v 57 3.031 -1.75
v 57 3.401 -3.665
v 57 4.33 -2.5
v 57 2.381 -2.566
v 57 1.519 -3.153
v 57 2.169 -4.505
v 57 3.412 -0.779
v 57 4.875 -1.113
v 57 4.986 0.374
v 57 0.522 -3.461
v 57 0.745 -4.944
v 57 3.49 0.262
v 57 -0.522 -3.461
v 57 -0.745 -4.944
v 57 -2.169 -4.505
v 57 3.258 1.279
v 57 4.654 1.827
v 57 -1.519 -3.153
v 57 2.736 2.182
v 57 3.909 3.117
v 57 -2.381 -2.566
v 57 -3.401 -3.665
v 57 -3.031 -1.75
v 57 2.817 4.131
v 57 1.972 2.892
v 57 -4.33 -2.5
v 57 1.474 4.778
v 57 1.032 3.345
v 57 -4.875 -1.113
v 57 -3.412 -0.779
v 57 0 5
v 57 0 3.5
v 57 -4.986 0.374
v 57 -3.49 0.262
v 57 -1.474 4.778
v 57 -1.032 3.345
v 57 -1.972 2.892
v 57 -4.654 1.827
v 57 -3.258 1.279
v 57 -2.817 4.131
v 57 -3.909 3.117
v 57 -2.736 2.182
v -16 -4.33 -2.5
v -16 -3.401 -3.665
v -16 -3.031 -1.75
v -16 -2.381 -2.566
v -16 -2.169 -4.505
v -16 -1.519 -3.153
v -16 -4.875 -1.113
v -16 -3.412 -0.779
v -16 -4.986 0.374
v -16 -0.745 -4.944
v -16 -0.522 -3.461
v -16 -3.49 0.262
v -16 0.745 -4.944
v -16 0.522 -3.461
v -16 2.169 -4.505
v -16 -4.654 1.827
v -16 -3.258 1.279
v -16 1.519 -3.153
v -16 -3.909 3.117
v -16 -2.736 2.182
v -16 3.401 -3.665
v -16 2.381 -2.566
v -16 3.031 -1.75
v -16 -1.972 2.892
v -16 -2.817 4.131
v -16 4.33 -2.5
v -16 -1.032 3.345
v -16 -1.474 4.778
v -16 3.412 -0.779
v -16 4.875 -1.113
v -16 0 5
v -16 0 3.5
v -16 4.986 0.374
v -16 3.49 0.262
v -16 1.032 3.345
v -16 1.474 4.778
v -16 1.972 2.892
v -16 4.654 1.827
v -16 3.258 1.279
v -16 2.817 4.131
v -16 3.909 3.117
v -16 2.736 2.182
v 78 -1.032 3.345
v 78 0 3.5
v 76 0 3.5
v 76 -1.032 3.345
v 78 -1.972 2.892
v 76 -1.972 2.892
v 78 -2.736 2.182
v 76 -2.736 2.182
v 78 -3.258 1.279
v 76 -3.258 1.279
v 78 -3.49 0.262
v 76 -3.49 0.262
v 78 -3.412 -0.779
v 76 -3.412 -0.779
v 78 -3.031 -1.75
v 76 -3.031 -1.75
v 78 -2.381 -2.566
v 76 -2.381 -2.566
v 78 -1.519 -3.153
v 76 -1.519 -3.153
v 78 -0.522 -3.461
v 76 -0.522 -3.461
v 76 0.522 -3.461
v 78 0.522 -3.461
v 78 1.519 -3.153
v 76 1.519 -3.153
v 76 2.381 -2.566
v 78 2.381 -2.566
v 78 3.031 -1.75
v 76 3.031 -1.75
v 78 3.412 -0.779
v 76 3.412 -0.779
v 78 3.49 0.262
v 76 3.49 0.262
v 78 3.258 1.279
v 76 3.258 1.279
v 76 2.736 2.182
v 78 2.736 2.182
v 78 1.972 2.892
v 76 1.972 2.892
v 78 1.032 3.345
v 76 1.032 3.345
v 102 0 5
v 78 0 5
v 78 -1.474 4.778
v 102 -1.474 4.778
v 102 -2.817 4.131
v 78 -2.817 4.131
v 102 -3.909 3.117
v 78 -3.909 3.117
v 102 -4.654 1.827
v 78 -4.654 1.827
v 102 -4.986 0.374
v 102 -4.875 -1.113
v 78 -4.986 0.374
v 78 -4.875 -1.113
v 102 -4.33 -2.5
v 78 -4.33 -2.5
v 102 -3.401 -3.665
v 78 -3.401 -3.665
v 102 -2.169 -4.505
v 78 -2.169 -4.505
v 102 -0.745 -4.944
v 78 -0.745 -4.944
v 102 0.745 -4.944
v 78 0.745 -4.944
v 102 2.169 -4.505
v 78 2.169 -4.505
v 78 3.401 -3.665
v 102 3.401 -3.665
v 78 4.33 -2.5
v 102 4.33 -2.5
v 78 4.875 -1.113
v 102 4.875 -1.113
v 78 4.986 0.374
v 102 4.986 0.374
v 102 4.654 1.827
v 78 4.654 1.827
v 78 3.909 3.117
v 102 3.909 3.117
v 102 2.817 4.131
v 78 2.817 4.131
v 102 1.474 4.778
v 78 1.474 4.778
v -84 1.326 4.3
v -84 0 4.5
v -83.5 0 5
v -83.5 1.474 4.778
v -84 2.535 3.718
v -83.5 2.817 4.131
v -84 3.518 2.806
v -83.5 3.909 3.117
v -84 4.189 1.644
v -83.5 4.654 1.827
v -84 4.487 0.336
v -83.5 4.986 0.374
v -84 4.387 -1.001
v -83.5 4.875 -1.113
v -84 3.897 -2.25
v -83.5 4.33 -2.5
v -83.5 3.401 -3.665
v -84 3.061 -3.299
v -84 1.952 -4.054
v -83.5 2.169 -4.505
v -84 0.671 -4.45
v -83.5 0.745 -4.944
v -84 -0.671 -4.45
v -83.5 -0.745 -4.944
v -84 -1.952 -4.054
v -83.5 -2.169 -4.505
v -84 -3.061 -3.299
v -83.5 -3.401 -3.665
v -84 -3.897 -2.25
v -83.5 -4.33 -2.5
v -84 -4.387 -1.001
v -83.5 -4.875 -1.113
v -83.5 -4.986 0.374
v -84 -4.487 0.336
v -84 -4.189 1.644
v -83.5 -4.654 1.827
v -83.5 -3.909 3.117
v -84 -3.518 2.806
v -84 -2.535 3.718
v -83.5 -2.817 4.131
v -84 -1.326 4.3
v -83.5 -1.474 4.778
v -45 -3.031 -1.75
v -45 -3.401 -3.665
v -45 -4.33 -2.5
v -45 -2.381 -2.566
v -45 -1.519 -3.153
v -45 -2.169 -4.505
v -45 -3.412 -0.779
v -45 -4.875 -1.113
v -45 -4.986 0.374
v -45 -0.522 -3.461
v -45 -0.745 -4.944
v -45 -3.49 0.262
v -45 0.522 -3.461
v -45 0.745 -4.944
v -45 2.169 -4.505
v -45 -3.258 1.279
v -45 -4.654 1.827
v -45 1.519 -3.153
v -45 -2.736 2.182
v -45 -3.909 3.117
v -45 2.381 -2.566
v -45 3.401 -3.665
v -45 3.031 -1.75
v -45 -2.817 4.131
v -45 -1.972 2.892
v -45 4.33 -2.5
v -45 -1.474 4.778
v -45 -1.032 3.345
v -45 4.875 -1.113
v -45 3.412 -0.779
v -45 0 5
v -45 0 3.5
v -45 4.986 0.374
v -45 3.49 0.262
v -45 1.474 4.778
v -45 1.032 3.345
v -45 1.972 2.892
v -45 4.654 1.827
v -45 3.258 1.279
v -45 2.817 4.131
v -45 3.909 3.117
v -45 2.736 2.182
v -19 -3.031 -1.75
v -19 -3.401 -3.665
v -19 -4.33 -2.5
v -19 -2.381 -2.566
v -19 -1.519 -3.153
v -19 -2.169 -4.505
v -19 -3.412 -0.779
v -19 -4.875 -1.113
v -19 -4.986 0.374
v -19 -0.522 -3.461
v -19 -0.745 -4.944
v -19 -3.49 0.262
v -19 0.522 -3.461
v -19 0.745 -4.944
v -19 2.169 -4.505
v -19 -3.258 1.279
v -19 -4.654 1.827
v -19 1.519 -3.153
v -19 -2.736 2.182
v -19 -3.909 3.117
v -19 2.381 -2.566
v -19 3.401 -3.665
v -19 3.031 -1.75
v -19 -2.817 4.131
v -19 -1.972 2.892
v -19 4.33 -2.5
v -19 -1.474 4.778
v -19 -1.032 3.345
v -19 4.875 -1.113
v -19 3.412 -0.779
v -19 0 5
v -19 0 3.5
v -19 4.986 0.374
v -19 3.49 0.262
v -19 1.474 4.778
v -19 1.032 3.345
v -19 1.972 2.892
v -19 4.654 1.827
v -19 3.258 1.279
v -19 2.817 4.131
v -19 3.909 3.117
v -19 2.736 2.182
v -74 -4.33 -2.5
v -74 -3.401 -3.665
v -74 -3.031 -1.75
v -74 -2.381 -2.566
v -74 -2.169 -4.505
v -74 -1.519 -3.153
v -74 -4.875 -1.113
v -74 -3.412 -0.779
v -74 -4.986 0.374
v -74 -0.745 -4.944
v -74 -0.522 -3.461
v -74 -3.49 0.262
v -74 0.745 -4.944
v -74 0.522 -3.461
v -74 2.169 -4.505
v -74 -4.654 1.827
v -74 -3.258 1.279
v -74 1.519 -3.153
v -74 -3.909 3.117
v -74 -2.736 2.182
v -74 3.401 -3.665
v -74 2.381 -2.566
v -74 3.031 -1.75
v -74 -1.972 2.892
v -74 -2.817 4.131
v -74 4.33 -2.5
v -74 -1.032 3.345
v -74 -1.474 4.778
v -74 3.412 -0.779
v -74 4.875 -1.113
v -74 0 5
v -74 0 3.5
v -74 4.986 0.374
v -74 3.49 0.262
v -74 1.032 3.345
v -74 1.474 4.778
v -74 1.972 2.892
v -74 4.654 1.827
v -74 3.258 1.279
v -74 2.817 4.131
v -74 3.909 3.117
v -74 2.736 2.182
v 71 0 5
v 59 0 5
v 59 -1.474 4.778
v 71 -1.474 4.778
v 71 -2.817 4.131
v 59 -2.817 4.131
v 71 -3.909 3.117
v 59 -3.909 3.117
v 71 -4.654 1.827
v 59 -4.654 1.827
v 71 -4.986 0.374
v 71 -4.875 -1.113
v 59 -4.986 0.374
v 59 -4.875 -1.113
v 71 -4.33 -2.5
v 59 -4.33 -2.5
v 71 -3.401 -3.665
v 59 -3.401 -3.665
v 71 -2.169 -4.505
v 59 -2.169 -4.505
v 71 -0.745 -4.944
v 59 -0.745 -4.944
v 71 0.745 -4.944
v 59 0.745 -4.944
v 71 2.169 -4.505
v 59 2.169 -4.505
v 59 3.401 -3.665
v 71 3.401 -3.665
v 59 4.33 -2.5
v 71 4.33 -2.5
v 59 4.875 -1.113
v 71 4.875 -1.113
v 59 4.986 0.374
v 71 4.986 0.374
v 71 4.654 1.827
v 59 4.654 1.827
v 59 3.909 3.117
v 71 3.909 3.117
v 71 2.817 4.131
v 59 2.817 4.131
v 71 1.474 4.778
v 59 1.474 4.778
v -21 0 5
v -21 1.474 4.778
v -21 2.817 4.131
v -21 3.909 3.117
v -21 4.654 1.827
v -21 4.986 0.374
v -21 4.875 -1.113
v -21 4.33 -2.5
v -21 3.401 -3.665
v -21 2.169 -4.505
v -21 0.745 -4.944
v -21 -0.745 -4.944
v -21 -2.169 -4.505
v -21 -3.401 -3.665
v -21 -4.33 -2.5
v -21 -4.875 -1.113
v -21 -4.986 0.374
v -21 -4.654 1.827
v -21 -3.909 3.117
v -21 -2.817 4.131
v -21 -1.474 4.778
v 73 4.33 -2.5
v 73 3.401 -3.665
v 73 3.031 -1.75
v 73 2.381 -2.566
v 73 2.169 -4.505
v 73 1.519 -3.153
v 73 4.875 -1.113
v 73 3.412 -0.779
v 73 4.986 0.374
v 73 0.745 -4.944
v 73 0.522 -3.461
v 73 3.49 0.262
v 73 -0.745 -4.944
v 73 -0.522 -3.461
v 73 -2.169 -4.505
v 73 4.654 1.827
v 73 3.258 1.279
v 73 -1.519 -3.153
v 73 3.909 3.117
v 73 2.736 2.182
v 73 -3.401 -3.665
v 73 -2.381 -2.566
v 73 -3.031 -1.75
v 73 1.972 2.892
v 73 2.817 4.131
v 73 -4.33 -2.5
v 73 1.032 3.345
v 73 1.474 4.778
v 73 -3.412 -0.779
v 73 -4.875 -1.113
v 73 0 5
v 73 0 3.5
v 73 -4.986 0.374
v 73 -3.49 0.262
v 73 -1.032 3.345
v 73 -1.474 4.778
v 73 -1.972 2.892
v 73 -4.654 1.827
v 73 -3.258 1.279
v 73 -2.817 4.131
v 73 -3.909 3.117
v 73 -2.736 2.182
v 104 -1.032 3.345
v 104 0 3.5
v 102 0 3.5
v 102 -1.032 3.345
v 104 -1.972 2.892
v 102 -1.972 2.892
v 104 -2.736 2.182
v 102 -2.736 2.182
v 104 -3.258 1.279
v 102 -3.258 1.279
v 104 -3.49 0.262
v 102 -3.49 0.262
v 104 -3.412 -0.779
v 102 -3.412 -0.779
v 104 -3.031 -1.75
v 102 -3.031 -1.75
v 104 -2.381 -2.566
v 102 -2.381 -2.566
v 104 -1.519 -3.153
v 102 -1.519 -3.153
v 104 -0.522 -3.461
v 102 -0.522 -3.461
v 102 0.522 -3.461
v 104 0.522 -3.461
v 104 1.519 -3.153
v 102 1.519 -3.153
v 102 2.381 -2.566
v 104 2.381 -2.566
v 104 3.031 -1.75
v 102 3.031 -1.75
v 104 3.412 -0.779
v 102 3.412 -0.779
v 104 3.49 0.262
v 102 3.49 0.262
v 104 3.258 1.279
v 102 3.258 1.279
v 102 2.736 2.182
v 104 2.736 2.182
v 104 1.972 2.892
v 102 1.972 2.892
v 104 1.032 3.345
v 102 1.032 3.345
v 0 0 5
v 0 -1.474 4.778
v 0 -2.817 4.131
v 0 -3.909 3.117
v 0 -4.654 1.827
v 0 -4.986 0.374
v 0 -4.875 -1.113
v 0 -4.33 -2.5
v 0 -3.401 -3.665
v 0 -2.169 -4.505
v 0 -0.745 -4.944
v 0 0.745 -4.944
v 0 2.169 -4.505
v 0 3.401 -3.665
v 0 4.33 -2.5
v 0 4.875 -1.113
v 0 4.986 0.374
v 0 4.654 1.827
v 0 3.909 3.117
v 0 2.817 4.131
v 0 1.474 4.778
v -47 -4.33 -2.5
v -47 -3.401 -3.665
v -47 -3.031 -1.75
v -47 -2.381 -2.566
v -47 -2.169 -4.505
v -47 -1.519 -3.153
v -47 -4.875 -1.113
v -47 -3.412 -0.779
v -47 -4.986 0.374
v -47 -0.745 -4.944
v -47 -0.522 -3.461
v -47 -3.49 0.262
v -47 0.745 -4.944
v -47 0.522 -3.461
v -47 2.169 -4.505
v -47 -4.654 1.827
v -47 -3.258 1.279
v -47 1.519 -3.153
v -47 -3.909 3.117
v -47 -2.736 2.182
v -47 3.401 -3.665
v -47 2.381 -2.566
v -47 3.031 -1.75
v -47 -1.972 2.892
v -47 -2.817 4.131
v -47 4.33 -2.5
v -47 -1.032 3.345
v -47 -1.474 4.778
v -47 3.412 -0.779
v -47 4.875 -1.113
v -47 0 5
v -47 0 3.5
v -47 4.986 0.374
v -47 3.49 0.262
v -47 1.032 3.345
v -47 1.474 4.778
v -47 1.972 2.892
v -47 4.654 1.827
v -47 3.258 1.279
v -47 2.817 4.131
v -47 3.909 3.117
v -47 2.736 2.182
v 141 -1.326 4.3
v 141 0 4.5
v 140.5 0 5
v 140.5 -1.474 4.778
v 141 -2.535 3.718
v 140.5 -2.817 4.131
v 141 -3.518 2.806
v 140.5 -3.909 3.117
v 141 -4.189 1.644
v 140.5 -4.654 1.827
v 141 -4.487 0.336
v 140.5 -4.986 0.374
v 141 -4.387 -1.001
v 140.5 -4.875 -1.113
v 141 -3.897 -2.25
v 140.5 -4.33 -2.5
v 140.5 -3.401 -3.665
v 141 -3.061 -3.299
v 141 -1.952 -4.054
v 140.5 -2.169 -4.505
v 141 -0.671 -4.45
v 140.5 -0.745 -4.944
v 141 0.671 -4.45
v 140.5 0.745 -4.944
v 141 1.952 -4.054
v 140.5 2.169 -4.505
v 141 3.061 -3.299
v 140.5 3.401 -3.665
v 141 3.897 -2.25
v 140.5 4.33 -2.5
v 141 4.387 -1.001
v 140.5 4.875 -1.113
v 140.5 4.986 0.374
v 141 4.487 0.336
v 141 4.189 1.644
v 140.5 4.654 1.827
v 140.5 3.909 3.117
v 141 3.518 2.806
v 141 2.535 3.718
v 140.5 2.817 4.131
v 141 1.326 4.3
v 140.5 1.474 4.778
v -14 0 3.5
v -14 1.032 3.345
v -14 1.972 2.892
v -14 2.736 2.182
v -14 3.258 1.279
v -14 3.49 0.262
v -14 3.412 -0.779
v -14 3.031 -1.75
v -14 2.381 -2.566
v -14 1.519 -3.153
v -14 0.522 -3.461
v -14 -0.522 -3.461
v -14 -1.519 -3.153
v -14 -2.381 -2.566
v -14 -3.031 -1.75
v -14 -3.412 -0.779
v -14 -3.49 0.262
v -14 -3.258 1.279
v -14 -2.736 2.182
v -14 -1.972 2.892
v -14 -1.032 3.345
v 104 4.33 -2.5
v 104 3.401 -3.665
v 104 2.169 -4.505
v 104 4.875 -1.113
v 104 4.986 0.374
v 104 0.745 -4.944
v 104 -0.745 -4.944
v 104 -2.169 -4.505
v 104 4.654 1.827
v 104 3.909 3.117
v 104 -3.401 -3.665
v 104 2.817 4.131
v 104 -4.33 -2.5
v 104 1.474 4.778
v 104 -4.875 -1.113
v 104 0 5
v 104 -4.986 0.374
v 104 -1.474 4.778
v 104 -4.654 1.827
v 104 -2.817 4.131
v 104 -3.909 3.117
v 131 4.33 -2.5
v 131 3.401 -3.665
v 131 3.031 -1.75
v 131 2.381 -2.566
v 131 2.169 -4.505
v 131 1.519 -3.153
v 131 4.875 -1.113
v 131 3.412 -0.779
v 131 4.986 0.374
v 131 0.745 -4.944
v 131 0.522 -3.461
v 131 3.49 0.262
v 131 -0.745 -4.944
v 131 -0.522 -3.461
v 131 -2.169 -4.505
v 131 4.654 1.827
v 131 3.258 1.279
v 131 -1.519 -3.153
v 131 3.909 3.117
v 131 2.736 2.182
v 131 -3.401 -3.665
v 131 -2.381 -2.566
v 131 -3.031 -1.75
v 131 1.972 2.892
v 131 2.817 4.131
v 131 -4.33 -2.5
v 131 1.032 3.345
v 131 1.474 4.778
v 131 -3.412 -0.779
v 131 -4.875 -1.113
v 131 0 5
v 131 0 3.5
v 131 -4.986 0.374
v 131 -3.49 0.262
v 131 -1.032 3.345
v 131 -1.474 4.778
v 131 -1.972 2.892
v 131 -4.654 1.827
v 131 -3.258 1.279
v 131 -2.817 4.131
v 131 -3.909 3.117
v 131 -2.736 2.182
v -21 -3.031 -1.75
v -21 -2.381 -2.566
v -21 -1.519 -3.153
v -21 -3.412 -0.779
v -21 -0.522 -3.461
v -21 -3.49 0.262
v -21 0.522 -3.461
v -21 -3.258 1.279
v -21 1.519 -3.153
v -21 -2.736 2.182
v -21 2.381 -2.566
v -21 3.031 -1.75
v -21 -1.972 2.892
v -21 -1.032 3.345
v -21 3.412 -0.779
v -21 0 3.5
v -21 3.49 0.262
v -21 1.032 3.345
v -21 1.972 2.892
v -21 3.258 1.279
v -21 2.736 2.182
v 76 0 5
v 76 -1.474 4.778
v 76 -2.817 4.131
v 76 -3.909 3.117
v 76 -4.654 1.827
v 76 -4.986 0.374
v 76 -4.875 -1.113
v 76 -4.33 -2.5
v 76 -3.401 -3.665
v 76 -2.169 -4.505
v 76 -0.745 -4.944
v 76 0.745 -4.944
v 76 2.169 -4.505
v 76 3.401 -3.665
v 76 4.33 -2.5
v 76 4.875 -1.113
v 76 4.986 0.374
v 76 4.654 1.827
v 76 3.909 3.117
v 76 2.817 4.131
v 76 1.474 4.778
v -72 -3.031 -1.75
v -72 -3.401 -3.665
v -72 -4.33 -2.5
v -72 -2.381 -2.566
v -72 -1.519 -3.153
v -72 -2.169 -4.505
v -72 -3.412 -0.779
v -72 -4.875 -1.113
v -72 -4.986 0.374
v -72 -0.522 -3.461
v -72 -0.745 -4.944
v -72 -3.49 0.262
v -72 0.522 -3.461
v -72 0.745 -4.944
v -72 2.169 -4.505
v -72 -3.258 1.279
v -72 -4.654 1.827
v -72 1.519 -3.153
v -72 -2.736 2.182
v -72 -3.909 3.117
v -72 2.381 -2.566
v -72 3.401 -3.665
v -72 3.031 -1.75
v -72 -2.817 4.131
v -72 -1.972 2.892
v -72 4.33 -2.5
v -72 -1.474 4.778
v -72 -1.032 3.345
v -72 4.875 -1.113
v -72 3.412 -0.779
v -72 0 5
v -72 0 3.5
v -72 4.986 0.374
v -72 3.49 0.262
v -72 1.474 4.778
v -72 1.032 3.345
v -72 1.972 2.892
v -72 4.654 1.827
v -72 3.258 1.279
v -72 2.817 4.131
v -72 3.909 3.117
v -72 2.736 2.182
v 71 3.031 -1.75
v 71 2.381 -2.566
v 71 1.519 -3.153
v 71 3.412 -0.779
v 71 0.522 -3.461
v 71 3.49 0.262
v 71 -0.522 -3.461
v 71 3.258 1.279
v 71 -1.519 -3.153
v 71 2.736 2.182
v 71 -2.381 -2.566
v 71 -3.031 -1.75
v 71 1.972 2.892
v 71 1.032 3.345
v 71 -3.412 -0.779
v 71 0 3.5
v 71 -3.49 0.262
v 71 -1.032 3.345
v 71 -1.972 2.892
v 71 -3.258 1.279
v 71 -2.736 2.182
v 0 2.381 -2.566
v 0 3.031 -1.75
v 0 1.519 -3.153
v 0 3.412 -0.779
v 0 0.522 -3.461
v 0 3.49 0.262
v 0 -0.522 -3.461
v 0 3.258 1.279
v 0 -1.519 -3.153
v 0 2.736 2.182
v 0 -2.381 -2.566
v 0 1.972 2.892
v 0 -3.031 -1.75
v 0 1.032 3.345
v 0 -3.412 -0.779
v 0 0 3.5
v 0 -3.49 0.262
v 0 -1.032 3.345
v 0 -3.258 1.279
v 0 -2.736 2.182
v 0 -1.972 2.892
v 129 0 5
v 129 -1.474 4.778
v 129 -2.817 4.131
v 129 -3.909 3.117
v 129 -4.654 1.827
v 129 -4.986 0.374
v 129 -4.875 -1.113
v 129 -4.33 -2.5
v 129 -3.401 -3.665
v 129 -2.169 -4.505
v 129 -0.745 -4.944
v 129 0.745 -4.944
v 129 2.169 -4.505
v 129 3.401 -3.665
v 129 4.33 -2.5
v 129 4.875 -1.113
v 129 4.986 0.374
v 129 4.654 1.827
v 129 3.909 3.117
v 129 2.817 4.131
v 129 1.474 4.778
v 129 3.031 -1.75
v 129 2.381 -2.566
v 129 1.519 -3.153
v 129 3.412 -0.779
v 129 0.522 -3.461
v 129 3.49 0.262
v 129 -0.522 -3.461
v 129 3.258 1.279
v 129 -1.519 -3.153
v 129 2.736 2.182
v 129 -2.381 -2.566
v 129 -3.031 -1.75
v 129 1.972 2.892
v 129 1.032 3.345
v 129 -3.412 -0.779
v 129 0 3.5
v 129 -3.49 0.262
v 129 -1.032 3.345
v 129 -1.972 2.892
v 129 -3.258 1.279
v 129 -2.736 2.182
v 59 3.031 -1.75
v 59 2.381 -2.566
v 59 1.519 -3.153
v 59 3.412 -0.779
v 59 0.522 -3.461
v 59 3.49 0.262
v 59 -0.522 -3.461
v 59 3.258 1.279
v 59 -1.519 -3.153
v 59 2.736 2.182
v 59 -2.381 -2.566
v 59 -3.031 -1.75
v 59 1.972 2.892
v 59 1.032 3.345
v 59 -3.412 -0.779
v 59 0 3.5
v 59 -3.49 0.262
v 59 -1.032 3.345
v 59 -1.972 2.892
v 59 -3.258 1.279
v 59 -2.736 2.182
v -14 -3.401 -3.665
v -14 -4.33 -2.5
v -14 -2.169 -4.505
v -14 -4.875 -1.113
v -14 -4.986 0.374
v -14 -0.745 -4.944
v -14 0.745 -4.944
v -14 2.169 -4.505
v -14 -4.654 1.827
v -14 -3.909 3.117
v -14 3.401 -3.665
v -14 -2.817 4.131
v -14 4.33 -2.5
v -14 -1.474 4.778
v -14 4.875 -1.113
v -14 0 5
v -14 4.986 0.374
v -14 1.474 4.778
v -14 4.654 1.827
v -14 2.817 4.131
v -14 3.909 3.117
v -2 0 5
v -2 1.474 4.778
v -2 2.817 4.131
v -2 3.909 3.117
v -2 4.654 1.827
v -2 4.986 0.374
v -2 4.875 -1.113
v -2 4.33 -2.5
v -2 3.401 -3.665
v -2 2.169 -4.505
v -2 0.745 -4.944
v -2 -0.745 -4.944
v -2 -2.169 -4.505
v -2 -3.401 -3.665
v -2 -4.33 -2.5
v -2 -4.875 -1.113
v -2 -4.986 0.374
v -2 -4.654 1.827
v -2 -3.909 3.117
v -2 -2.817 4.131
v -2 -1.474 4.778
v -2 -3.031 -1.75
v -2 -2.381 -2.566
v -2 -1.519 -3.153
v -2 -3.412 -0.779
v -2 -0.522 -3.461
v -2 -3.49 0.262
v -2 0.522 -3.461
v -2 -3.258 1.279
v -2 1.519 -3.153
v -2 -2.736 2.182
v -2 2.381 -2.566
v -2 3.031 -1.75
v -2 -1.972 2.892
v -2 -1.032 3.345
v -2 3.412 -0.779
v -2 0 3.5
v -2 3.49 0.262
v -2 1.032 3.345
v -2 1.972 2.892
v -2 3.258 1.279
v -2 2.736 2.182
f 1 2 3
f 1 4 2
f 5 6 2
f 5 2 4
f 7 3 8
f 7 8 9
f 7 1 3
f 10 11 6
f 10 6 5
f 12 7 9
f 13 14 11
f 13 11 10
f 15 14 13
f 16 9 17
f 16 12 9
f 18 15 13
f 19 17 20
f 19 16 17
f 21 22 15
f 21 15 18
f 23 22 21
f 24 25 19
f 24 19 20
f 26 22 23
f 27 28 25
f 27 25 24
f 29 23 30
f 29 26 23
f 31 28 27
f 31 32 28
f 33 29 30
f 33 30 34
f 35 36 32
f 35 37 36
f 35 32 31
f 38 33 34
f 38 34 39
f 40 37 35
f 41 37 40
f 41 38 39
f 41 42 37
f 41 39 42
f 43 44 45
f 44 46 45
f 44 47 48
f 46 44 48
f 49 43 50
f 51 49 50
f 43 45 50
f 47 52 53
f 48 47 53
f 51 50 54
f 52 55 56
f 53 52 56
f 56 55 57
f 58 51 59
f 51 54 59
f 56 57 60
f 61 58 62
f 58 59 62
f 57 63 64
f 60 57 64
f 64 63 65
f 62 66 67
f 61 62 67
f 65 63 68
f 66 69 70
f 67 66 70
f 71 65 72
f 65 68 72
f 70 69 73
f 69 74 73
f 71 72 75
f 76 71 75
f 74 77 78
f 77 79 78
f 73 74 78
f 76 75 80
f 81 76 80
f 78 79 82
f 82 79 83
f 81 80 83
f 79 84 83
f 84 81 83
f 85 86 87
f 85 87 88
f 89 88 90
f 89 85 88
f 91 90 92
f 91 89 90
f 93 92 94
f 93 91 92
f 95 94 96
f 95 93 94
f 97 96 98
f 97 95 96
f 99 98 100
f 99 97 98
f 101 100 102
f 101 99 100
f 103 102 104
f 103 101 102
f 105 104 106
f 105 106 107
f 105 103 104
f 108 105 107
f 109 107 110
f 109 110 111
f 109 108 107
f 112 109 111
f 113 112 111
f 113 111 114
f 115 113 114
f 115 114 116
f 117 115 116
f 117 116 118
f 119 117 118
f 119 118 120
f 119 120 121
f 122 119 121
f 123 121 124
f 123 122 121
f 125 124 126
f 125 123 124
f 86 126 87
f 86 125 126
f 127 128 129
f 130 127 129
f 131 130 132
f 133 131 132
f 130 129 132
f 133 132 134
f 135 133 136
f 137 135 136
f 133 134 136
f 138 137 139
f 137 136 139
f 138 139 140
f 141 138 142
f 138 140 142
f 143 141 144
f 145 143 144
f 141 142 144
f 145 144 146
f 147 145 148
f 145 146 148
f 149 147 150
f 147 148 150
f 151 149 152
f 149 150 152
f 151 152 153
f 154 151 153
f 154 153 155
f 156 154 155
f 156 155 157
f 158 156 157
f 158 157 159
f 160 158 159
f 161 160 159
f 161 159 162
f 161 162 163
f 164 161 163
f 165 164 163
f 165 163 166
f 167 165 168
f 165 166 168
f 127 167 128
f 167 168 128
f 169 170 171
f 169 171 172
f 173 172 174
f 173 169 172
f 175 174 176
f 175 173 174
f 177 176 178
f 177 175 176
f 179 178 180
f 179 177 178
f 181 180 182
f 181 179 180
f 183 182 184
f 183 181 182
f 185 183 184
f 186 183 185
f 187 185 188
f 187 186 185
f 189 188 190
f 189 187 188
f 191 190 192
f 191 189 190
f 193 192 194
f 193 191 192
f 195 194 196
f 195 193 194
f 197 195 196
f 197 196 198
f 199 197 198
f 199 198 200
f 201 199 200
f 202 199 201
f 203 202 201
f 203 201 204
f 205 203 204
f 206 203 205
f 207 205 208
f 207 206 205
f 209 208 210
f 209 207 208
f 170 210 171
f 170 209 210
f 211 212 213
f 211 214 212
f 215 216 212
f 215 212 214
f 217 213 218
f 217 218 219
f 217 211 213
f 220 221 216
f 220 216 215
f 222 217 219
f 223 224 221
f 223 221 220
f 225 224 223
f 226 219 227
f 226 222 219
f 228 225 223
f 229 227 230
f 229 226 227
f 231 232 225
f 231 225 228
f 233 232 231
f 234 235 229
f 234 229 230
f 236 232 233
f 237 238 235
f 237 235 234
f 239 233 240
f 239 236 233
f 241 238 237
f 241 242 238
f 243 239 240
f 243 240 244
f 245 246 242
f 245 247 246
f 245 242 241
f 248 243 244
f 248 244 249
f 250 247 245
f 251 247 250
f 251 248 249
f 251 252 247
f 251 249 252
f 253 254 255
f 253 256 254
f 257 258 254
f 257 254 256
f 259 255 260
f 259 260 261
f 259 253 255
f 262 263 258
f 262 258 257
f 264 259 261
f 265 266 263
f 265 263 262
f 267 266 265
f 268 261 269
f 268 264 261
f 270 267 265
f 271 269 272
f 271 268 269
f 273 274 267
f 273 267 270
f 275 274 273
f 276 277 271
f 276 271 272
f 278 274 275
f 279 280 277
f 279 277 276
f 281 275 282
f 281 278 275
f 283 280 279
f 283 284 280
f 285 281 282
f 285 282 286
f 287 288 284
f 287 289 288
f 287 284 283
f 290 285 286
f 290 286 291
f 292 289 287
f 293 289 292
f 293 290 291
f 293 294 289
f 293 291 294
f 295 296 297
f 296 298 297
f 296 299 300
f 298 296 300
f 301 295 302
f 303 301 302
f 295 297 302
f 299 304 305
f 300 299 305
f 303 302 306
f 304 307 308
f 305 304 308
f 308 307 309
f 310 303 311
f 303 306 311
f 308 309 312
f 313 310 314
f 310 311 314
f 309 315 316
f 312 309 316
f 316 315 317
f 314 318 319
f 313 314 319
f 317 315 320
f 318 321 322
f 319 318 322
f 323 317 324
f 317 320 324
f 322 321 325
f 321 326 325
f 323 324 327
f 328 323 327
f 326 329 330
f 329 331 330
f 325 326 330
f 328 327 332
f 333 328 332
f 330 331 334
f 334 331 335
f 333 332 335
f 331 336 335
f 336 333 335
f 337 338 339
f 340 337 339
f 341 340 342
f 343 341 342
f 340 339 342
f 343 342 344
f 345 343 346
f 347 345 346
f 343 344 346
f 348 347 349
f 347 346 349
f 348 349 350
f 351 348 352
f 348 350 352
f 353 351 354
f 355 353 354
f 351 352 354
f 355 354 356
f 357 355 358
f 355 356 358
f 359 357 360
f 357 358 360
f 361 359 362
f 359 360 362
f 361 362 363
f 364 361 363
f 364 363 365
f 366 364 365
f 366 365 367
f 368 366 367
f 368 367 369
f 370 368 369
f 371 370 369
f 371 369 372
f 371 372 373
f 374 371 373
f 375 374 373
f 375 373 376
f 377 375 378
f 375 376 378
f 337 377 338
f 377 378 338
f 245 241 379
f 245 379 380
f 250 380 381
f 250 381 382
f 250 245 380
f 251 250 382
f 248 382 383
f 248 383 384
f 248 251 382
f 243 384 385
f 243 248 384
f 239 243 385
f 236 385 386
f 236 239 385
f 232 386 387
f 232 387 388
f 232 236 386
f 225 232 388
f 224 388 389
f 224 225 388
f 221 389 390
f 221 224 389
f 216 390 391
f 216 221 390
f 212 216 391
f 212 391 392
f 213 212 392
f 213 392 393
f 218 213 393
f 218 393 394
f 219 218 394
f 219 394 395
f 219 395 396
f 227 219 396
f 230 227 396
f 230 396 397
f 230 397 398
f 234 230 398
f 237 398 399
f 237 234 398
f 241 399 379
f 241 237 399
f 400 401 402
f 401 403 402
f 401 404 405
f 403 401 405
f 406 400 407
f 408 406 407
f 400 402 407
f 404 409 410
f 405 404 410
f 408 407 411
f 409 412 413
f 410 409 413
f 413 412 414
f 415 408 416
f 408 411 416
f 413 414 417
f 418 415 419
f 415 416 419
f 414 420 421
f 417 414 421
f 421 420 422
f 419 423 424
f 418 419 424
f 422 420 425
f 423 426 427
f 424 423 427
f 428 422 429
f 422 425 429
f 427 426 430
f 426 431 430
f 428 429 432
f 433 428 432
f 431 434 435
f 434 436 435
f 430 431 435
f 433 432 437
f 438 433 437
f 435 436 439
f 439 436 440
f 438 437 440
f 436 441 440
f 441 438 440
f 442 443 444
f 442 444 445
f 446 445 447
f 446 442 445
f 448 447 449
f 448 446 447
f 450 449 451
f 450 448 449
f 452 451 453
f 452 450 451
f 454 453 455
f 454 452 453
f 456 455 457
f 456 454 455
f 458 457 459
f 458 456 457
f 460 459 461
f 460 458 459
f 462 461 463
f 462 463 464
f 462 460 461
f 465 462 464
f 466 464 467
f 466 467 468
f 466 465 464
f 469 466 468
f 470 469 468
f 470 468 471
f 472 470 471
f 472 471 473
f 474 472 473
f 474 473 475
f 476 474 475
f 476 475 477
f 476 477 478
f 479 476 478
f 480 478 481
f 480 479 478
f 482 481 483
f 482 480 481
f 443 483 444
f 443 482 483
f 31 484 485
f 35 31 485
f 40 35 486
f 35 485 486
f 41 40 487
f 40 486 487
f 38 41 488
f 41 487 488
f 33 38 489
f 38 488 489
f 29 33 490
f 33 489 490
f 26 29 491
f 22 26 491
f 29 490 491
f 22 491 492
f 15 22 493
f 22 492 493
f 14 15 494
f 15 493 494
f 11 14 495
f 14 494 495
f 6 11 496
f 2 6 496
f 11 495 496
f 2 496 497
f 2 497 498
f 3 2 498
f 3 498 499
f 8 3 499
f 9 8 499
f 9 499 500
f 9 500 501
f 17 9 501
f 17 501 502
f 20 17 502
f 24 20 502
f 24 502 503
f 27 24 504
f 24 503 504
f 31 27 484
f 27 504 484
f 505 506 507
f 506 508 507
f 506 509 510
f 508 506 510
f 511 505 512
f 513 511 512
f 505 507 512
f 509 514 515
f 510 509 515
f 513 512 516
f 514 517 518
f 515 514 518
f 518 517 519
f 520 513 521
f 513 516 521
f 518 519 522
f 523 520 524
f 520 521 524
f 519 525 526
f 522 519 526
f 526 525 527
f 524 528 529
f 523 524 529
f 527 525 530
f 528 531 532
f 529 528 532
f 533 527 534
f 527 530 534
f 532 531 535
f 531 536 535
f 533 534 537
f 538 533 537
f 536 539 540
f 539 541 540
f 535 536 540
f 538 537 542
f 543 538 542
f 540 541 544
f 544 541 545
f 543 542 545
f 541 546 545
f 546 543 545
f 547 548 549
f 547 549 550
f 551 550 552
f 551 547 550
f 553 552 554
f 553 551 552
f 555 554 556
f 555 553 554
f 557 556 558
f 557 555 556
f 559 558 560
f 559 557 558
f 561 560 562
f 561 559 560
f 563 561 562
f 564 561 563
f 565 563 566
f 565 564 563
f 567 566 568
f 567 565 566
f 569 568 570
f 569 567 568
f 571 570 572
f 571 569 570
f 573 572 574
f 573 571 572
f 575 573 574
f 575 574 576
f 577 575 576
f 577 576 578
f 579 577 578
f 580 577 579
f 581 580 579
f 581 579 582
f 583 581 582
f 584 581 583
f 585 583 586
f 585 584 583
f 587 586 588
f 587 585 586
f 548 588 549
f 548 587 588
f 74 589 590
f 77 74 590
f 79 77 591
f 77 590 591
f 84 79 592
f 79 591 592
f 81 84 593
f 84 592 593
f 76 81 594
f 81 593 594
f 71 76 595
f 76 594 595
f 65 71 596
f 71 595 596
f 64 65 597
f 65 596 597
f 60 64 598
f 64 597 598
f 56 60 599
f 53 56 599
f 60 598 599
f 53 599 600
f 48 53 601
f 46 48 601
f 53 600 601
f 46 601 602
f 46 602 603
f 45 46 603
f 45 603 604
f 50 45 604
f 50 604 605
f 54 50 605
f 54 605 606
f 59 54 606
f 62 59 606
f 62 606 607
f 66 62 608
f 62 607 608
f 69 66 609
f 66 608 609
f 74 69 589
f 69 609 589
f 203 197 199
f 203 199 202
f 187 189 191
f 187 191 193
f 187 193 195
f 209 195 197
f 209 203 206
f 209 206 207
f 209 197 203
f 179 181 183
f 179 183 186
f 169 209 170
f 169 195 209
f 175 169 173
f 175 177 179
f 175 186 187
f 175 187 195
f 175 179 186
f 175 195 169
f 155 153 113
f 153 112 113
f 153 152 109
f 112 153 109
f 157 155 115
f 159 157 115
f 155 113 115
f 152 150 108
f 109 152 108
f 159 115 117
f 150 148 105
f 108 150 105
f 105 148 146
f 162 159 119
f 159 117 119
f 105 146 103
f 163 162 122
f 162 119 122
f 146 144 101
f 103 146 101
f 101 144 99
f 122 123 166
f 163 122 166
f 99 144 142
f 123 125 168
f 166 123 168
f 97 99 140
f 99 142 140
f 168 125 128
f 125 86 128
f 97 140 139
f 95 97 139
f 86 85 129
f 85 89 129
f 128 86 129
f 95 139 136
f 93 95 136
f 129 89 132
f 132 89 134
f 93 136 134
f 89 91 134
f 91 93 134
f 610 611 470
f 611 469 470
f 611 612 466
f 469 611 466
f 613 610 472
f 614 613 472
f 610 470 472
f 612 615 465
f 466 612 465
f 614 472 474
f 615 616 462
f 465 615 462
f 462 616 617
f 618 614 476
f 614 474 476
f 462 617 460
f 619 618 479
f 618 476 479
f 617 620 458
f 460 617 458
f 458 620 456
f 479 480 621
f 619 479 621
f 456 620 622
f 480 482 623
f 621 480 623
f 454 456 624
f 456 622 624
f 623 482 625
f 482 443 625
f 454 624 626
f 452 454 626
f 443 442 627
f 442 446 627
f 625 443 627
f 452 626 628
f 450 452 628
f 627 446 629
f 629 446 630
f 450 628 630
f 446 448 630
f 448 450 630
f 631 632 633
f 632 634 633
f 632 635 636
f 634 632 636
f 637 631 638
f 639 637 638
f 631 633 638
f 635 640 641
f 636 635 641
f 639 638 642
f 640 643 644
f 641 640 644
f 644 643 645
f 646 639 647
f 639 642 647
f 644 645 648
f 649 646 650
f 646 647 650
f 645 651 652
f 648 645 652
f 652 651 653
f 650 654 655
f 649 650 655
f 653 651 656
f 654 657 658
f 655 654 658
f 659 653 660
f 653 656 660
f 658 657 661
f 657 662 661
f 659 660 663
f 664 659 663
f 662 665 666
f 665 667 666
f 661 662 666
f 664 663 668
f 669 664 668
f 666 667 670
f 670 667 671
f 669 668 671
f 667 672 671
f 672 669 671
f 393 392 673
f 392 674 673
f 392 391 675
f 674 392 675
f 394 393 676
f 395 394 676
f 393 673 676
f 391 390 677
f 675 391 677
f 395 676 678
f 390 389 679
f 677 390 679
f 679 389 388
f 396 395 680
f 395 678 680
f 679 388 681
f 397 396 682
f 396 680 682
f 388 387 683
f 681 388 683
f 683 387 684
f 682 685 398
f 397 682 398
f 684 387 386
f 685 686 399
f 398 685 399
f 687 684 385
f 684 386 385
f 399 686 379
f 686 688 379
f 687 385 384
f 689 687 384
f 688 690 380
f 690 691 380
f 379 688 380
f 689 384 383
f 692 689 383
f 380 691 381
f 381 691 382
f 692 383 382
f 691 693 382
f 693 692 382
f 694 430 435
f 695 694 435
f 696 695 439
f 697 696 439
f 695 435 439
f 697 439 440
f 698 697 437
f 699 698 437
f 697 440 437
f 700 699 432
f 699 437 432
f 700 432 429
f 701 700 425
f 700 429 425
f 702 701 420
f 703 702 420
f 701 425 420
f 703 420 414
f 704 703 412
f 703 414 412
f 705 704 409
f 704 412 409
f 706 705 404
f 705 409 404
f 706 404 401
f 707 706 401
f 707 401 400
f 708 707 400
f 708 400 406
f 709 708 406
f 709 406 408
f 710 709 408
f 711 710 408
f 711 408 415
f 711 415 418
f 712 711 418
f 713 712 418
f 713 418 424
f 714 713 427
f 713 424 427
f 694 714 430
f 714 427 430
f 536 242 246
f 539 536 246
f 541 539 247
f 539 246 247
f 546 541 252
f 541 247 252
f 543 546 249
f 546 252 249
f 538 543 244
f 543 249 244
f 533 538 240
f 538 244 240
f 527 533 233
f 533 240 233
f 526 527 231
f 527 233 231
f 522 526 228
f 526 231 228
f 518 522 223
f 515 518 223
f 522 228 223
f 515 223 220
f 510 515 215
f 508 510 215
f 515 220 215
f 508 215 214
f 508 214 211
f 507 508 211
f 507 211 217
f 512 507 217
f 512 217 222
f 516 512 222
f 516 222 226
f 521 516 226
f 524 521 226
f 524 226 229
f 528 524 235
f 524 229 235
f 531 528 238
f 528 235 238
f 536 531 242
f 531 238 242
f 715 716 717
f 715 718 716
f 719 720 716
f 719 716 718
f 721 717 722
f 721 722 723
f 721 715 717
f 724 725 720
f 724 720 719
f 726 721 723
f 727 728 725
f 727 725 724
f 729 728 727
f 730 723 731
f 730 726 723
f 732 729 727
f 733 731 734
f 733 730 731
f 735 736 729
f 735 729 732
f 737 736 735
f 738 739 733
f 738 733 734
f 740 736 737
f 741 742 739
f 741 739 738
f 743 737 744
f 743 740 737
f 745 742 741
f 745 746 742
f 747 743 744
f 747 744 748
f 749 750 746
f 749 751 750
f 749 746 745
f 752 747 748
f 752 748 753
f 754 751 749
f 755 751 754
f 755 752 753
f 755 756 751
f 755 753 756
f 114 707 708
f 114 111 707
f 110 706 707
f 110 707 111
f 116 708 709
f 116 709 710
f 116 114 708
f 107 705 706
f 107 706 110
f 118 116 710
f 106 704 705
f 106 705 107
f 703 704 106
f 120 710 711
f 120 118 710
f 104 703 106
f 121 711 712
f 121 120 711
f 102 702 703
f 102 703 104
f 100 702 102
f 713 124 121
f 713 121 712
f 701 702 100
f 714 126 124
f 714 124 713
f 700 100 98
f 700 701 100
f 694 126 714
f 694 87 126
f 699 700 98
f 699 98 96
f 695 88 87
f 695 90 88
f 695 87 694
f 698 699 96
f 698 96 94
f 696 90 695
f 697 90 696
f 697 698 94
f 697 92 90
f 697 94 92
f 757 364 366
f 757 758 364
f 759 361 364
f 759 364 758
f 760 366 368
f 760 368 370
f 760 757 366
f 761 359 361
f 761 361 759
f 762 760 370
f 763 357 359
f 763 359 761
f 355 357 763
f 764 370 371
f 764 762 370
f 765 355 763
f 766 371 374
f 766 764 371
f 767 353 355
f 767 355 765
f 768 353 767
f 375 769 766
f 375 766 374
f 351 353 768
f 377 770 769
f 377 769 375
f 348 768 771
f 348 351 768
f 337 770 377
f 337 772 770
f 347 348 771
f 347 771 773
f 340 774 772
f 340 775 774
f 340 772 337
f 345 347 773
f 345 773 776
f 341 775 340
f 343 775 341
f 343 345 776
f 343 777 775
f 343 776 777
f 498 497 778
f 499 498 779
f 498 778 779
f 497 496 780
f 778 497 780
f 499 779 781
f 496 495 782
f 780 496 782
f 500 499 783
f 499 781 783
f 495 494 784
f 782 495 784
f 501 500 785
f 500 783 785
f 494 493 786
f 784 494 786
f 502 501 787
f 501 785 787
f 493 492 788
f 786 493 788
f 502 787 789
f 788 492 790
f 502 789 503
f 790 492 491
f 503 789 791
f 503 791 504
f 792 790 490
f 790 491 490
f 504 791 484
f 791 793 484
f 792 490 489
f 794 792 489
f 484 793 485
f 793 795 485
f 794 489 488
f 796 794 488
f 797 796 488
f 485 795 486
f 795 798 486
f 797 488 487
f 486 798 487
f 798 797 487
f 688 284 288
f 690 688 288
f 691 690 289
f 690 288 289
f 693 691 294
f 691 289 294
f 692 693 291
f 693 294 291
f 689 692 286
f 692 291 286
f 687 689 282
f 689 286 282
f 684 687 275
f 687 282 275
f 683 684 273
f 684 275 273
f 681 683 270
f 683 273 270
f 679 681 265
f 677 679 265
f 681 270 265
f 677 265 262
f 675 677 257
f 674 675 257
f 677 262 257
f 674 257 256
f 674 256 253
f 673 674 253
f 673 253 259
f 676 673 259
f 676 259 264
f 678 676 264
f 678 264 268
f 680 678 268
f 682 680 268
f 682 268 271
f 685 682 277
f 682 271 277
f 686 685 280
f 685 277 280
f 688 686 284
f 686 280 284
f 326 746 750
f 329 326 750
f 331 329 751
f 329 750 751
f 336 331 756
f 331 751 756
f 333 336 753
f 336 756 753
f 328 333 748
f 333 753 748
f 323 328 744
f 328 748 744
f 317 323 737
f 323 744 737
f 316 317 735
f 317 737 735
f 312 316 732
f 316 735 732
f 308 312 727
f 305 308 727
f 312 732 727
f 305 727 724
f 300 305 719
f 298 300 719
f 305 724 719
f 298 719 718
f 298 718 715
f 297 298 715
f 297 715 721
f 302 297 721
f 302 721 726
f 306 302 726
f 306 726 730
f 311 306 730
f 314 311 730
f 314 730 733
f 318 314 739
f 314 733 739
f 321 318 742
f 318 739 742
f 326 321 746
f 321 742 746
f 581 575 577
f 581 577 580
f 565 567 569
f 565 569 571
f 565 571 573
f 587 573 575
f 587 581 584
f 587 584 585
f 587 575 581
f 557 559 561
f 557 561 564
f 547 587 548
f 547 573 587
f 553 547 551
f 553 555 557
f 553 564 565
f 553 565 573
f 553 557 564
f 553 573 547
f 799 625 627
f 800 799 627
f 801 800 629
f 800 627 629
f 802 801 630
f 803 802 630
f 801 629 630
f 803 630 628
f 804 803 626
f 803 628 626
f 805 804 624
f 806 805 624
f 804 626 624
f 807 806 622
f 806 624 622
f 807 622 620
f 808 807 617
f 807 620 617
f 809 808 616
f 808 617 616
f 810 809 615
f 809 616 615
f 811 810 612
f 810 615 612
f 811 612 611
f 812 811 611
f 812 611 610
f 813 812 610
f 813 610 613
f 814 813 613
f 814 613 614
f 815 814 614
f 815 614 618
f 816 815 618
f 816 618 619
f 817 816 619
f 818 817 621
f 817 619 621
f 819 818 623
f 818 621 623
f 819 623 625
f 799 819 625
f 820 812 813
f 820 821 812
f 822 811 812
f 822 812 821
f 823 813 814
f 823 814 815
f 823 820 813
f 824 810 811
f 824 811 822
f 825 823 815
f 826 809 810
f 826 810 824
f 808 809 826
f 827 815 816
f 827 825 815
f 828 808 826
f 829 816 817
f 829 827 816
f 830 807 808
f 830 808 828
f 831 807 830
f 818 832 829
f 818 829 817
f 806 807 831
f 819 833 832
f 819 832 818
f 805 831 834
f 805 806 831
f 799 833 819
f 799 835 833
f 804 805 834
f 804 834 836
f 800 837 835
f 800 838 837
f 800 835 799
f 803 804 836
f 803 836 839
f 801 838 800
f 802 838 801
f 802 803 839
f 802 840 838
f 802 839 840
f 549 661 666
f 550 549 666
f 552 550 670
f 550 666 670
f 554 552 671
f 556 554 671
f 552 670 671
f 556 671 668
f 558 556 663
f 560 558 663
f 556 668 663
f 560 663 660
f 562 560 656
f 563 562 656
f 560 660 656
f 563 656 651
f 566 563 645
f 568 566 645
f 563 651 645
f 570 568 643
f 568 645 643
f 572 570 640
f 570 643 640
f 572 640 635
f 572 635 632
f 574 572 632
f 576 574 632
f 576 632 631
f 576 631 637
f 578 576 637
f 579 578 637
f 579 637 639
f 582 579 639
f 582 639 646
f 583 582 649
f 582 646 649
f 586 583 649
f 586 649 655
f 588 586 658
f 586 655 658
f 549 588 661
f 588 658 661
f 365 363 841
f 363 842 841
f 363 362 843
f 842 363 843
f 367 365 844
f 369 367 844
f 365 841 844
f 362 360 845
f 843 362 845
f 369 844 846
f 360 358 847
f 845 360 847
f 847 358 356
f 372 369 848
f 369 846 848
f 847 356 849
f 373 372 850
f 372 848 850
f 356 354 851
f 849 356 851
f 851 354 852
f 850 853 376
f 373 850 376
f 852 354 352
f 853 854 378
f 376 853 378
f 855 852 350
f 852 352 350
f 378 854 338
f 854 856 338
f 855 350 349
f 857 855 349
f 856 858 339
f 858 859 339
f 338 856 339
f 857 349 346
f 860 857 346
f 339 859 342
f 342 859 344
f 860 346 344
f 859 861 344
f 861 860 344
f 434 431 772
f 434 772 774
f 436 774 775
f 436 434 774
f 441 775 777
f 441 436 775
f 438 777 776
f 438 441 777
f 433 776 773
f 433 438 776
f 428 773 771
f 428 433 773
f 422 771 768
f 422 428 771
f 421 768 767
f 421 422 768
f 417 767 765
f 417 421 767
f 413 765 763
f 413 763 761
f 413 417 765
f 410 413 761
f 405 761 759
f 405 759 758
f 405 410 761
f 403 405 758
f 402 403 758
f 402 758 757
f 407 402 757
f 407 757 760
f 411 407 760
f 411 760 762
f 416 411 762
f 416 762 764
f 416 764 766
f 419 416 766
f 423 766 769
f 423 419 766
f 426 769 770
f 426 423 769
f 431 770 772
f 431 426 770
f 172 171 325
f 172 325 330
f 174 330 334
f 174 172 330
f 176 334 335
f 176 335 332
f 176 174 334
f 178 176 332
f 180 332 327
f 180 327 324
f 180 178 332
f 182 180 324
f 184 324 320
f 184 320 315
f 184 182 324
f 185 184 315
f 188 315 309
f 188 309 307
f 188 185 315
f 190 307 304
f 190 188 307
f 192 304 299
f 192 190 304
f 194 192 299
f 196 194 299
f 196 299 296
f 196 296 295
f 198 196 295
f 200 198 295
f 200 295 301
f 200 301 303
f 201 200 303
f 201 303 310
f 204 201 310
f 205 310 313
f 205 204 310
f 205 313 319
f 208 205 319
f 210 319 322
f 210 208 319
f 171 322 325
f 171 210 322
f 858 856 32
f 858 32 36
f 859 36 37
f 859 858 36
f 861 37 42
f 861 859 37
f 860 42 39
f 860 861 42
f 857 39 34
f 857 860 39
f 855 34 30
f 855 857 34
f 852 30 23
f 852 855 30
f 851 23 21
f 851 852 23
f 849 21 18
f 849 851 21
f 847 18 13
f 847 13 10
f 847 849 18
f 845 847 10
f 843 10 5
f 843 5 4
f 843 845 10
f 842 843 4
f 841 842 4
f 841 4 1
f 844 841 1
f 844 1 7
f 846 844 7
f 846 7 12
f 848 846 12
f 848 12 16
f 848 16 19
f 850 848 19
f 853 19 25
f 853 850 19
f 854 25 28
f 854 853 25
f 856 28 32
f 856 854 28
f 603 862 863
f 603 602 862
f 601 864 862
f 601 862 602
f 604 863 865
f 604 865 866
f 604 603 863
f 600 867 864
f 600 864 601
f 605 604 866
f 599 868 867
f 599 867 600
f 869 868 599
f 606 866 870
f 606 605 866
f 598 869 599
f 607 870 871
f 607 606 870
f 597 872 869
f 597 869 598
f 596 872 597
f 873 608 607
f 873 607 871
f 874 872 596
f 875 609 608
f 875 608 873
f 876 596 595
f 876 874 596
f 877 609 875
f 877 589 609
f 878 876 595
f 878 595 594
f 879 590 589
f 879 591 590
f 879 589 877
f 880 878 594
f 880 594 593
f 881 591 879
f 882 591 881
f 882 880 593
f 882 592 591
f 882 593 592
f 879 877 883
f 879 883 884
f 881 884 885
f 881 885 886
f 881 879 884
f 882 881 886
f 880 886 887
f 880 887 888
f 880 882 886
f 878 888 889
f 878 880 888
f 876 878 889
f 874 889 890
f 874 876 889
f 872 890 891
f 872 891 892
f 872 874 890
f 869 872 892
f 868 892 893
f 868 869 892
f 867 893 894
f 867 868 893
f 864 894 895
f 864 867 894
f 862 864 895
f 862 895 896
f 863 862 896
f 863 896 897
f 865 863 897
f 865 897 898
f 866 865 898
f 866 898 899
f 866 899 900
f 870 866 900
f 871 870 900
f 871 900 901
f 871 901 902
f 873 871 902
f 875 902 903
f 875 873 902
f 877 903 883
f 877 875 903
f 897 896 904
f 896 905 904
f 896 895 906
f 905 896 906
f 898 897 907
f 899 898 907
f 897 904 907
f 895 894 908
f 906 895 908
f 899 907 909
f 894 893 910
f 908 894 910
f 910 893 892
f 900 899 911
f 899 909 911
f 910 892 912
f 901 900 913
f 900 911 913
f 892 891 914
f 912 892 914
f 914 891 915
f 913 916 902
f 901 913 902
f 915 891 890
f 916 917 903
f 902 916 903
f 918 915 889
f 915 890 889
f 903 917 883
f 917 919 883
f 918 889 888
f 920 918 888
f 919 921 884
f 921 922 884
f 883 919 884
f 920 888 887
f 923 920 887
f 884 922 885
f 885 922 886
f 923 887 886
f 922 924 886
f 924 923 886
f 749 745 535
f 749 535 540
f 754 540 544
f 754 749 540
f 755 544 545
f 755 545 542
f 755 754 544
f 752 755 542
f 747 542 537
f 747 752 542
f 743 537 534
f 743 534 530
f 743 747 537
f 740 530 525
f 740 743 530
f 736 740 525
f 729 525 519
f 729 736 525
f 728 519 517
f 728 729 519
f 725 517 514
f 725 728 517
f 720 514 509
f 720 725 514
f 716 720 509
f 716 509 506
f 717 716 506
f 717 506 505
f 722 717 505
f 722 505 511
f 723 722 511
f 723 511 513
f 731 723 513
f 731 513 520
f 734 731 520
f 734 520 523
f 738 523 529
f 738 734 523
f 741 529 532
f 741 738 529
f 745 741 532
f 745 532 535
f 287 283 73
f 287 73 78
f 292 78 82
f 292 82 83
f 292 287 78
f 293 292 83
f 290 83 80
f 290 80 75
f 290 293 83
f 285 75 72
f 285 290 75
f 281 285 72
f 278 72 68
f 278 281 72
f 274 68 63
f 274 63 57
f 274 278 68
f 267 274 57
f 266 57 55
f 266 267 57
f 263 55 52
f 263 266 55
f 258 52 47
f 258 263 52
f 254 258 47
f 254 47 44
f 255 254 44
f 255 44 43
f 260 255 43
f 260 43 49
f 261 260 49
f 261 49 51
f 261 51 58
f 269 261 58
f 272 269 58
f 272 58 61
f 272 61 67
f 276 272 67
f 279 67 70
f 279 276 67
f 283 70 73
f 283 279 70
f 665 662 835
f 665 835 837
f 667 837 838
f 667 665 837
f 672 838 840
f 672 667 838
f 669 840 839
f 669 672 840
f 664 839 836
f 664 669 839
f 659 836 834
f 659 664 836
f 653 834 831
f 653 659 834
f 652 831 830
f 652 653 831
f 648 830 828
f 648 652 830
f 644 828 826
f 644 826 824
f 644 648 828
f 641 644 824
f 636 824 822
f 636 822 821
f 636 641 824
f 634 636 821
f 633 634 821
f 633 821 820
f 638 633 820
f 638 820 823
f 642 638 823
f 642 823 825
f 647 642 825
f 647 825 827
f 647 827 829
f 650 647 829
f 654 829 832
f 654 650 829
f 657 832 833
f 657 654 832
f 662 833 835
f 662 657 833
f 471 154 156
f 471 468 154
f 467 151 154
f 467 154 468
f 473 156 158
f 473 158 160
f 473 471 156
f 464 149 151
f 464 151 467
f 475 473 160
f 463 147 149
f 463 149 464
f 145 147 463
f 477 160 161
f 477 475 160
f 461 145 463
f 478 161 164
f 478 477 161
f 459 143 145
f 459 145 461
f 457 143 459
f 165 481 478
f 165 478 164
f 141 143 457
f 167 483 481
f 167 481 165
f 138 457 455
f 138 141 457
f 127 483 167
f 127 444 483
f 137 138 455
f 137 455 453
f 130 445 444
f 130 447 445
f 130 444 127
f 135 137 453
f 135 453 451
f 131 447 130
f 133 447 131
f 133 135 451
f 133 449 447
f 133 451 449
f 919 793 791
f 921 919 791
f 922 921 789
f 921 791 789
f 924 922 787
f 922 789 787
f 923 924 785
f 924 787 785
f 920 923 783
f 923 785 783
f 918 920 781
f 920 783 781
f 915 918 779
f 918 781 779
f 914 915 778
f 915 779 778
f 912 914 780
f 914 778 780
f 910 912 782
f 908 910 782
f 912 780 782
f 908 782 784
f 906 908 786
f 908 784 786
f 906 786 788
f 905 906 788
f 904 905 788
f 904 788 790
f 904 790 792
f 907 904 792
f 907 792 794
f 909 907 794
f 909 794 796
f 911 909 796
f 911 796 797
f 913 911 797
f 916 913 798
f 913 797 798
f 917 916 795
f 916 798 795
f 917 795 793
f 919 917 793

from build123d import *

# Parameters (mm, degrees)
SKETCH_4_R       = 5
EXTRUDE_4_DEPTH  = 57
SKETCH_5_R       = 3.5
EXTRUDE_5_DEPTH  = 2
EXTRUDE_START    = 12
SKETCH_6_R       = 5
EXTRUDE_6_DEPTH  = 12
EXTRUDE_START_2  = 2
SKETCH_7_R       = 3.5
EXTRUDE_7_DEPTH  = 2
SKETCH_8_R       = 5
EXTRUDE_8_DEPTH  = 12
SKETCH_9_R       = 3.5
EXTRUDE_9_DEPTH  = 2
SKETCH_10_R      = 5
EXTRUDE_10_DEPTH = 3
SKETCH_11_R      = 3.5
EXTRUDE_11_DEPTH = 2
SKETCH_12_R      = 5
EXTRUDE_12_DEPTH = 24
SKETCH_13_R      = 3.5
EXTRUDE_13_DEPTH = 2
SKETCH_14_R      = 5
EXTRUDE_14_DEPTH = 25
SKETCH_15_R      = 3.5
EXTRUDE_15_DEPTH = 2
SKETCH_16_R      = 5
EXTRUDE_16_DEPTH = 10
SKETCH_33_R      = 3.5
EXTRUDE_25_DEPTH = 2
EXTRUDE_START_3  = 3
SKETCH_34_R      = 5
EXTRUDE_26_DEPTH = 3
SKETCH_35_R      = 3.5
EXTRUDE_27_DEPTH = 2
EXTRUDE_START_4  = 24
SKETCH_36_R      = 5
EXTRUDE_28_DEPTH = 24
SKETCH_37_R      = 3.5
EXTRUDE_29_DEPTH = 2
EXTRUDE_START_5  = 25
SKETCH_38_R      = 5
EXTRUDE_30_DEPTH = 25
SKETCH_39_R      = 3.5
EXTRUDE_31_DEPTH = 2
EXTRUDE_START_6  = 10
SKETCH_40_R      = 5
EXTRUDE_32_DEPTH = 10
CHAMFER_1_SIZE   = 0.5


with BuildPart() as part:
    # 草图4 → 凸台-拉伸4 (new body)
    with BuildSketch(Plane(origin=(0, 0, 0), x_dir=(0, 0, -1), z_dir=(1, 0, 0))):
        with Locations(Location((0, 0, 0), (0, 0, 180))):
            Circle(SKETCH_4_R)
    extrude(amount=EXTRUDE_4_DEPTH)

    # 草图5 → 凸台-拉伸5 (add)
    with BuildSketch(Plane.ZY):
        Circle(SKETCH_5_R)
    extrude(amount=EXTRUDE_5_DEPTH)

    # 草图6 → 凸台-拉伸6 (add)
    with BuildSketch(Plane.ZY.offset(2).offset(EXTRUDE_START)):
        Circle(SKETCH_6_R)
    extrude(amount=-EXTRUDE_6_DEPTH)

    # 草图7 → 凸台-拉伸7 (add)
    with BuildSketch(Plane(origin=(57, 0, 0), x_dir=(0, 0, -1), z_dir=(1, 0, 0)).offset(EXTRUDE_START_2)):
        with Locations(Location((0, 0, 0), (0, 0, 180))):
            Circle(SKETCH_7_R)
    extrude(amount=-EXTRUDE_7_DEPTH)

    # 草图8 → 凸台-拉伸8 (add)
    with BuildSketch(Plane(origin=(59, 0, 0), x_dir=(0, 0, -1), z_dir=(1, 0, 0))):
        with Locations(Location((0, 0, 0), (0, 0, 180))):
            Circle(SKETCH_8_R)
    extrude(amount=EXTRUDE_8_DEPTH)

    # 草图9 → 凸台-拉伸9 (add)
    with BuildSketch(Plane(origin=(71, 0, 0), x_dir=(0, 0, -1), z_dir=(1, 0, 0)).offset(EXTRUDE_START_2)):
        with Locations(Location((0, 0, 0), (0, 0, 180))):
            Circle(SKETCH_9_R)
    extrude(amount=-EXTRUDE_9_DEPTH)

    # 草图10 → 凸台-拉伸10 (add)
    with BuildSketch(Plane(origin=(73, 0, 0), x_dir=(0, 0, -1), z_dir=(1, 0, 0))):
        with Locations(Location((0, 0, 0), (0, 0, 180))):
            Circle(SKETCH_10_R)
    extrude(amount=EXTRUDE_10_DEPTH)

    # 草图11 → 凸台-拉伸11 (add)
    with BuildSketch(Plane(origin=(76, 0, 0), x_dir=(0, 0, -1), z_dir=(1, 0, 0)).offset(EXTRUDE_START_2)):
        with Locations(Location((0, 0, 0), (0, 0, 180))):
            Circle(SKETCH_11_R)
    extrude(amount=-EXTRUDE_11_DEPTH)

    # 草图12 → 凸台-拉伸12 (add)
    with BuildSketch(Plane(origin=(78, 0, 0), x_dir=(0, 0, -1), z_dir=(1, 0, 0))):
        with Locations(Location((0, 0, 0), (0, 0, 180))):
            Circle(SKETCH_12_R)
    extrude(amount=EXTRUDE_12_DEPTH)

    # 草图13 → 凸台-拉伸13 (add)
    with BuildSketch(Plane(origin=(102, 0, 0), x_dir=(0, 0, -1), z_dir=(1, 0, 0)).offset(EXTRUDE_START_2)):
        with Locations(Location((0, 0, 0), (0, 0, 180))):
            Circle(SKETCH_13_R)
    extrude(amount=-EXTRUDE_13_DEPTH)

    # 草图14 → 凸台-拉伸14 (add)
    with BuildSketch(Plane(origin=(104, 0, 0), x_dir=(0, 0, -1), z_dir=(1, 0, 0))):
        with Locations(Location((0, 0, 0), (0, 0, 180))):
            Circle(SKETCH_14_R)
    extrude(amount=EXTRUDE_14_DEPTH)

    # 草图15 → 凸台-拉伸15 (add)
    with BuildSketch(Plane(origin=(129, 0, 0), x_dir=(0, 0, -1), z_dir=(1, 0, 0)).offset(EXTRUDE_START_2)):
        with Locations(Location((0, 0, 0), (0, 0, 180))):
            Circle(SKETCH_15_R)
    extrude(amount=-EXTRUDE_15_DEPTH)

    # 草图16 → 凸台-拉伸16 (add)
    with BuildSketch(Plane(origin=(131, 0, 0), x_dir=(0, 0, -1), z_dir=(1, 0, 0))):
        with Locations(Location((0, 0, 0), (0, 0, 180))):
            Circle(SKETCH_16_R)
    extrude(amount=EXTRUDE_16_DEPTH)

    # 草图33 → 凸台-拉伸25 (add)
    with BuildSketch(Plane.ZY.offset(14)):
        Circle(SKETCH_33_R)
    extrude(amount=EXTRUDE_25_DEPTH)

    # 草图34 → 凸台-拉伸26 (add)
    with BuildSketch(Plane.ZY.offset(16).offset(EXTRUDE_START_3)):
        Circle(SKETCH_34_R)
    extrude(amount=-EXTRUDE_26_DEPTH)

    # 草图35 → 凸台-拉伸27 (add)
    with BuildSketch(Plane.ZY.offset(19)):
        Circle(SKETCH_35_R)
    extrude(amount=EXTRUDE_27_DEPTH)

    # 草图36 → 凸台-拉伸28 (add)
    with BuildSketch(Plane.ZY.offset(21).offset(EXTRUDE_START_4)):
        Circle(SKETCH_36_R)
    extrude(amount=-EXTRUDE_28_DEPTH)

    # 草图37 → 凸台-拉伸29 (add)
    with BuildSketch(Plane.ZY.offset(45)):
        Circle(SKETCH_37_R)
    extrude(amount=EXTRUDE_29_DEPTH)

    # 草图38 → 凸台-拉伸30 (add)
    with BuildSketch(Plane.ZY.offset(47).offset(EXTRUDE_START_5)):
        Circle(SKETCH_38_R)
    extrude(amount=-EXTRUDE_30_DEPTH)

    # 草图39 → 凸台-拉伸31 (add)
    with BuildSketch(Plane.ZY.offset(72)):
        Circle(SKETCH_39_R)
    extrude(amount=EXTRUDE_31_DEPTH)

    # 草图40 → 凸台-拉伸32 (add)
    with BuildSketch(Plane.ZY.offset(74).offset(EXTRUDE_START_6)):
        Circle(SKETCH_40_R)
    extrude(amount=-EXTRUDE_32_DEPTH)

    # 倒角1
    chamfer_1_edges = [part.edges().sort_by_distance(p)[0] for p in [
        (141, 0, -5),
        (-84, 0, -5),
    ]]
    chamfer(chamfer_1_edges, length=CHAMFER_1_SIZE)


solid = part.part
